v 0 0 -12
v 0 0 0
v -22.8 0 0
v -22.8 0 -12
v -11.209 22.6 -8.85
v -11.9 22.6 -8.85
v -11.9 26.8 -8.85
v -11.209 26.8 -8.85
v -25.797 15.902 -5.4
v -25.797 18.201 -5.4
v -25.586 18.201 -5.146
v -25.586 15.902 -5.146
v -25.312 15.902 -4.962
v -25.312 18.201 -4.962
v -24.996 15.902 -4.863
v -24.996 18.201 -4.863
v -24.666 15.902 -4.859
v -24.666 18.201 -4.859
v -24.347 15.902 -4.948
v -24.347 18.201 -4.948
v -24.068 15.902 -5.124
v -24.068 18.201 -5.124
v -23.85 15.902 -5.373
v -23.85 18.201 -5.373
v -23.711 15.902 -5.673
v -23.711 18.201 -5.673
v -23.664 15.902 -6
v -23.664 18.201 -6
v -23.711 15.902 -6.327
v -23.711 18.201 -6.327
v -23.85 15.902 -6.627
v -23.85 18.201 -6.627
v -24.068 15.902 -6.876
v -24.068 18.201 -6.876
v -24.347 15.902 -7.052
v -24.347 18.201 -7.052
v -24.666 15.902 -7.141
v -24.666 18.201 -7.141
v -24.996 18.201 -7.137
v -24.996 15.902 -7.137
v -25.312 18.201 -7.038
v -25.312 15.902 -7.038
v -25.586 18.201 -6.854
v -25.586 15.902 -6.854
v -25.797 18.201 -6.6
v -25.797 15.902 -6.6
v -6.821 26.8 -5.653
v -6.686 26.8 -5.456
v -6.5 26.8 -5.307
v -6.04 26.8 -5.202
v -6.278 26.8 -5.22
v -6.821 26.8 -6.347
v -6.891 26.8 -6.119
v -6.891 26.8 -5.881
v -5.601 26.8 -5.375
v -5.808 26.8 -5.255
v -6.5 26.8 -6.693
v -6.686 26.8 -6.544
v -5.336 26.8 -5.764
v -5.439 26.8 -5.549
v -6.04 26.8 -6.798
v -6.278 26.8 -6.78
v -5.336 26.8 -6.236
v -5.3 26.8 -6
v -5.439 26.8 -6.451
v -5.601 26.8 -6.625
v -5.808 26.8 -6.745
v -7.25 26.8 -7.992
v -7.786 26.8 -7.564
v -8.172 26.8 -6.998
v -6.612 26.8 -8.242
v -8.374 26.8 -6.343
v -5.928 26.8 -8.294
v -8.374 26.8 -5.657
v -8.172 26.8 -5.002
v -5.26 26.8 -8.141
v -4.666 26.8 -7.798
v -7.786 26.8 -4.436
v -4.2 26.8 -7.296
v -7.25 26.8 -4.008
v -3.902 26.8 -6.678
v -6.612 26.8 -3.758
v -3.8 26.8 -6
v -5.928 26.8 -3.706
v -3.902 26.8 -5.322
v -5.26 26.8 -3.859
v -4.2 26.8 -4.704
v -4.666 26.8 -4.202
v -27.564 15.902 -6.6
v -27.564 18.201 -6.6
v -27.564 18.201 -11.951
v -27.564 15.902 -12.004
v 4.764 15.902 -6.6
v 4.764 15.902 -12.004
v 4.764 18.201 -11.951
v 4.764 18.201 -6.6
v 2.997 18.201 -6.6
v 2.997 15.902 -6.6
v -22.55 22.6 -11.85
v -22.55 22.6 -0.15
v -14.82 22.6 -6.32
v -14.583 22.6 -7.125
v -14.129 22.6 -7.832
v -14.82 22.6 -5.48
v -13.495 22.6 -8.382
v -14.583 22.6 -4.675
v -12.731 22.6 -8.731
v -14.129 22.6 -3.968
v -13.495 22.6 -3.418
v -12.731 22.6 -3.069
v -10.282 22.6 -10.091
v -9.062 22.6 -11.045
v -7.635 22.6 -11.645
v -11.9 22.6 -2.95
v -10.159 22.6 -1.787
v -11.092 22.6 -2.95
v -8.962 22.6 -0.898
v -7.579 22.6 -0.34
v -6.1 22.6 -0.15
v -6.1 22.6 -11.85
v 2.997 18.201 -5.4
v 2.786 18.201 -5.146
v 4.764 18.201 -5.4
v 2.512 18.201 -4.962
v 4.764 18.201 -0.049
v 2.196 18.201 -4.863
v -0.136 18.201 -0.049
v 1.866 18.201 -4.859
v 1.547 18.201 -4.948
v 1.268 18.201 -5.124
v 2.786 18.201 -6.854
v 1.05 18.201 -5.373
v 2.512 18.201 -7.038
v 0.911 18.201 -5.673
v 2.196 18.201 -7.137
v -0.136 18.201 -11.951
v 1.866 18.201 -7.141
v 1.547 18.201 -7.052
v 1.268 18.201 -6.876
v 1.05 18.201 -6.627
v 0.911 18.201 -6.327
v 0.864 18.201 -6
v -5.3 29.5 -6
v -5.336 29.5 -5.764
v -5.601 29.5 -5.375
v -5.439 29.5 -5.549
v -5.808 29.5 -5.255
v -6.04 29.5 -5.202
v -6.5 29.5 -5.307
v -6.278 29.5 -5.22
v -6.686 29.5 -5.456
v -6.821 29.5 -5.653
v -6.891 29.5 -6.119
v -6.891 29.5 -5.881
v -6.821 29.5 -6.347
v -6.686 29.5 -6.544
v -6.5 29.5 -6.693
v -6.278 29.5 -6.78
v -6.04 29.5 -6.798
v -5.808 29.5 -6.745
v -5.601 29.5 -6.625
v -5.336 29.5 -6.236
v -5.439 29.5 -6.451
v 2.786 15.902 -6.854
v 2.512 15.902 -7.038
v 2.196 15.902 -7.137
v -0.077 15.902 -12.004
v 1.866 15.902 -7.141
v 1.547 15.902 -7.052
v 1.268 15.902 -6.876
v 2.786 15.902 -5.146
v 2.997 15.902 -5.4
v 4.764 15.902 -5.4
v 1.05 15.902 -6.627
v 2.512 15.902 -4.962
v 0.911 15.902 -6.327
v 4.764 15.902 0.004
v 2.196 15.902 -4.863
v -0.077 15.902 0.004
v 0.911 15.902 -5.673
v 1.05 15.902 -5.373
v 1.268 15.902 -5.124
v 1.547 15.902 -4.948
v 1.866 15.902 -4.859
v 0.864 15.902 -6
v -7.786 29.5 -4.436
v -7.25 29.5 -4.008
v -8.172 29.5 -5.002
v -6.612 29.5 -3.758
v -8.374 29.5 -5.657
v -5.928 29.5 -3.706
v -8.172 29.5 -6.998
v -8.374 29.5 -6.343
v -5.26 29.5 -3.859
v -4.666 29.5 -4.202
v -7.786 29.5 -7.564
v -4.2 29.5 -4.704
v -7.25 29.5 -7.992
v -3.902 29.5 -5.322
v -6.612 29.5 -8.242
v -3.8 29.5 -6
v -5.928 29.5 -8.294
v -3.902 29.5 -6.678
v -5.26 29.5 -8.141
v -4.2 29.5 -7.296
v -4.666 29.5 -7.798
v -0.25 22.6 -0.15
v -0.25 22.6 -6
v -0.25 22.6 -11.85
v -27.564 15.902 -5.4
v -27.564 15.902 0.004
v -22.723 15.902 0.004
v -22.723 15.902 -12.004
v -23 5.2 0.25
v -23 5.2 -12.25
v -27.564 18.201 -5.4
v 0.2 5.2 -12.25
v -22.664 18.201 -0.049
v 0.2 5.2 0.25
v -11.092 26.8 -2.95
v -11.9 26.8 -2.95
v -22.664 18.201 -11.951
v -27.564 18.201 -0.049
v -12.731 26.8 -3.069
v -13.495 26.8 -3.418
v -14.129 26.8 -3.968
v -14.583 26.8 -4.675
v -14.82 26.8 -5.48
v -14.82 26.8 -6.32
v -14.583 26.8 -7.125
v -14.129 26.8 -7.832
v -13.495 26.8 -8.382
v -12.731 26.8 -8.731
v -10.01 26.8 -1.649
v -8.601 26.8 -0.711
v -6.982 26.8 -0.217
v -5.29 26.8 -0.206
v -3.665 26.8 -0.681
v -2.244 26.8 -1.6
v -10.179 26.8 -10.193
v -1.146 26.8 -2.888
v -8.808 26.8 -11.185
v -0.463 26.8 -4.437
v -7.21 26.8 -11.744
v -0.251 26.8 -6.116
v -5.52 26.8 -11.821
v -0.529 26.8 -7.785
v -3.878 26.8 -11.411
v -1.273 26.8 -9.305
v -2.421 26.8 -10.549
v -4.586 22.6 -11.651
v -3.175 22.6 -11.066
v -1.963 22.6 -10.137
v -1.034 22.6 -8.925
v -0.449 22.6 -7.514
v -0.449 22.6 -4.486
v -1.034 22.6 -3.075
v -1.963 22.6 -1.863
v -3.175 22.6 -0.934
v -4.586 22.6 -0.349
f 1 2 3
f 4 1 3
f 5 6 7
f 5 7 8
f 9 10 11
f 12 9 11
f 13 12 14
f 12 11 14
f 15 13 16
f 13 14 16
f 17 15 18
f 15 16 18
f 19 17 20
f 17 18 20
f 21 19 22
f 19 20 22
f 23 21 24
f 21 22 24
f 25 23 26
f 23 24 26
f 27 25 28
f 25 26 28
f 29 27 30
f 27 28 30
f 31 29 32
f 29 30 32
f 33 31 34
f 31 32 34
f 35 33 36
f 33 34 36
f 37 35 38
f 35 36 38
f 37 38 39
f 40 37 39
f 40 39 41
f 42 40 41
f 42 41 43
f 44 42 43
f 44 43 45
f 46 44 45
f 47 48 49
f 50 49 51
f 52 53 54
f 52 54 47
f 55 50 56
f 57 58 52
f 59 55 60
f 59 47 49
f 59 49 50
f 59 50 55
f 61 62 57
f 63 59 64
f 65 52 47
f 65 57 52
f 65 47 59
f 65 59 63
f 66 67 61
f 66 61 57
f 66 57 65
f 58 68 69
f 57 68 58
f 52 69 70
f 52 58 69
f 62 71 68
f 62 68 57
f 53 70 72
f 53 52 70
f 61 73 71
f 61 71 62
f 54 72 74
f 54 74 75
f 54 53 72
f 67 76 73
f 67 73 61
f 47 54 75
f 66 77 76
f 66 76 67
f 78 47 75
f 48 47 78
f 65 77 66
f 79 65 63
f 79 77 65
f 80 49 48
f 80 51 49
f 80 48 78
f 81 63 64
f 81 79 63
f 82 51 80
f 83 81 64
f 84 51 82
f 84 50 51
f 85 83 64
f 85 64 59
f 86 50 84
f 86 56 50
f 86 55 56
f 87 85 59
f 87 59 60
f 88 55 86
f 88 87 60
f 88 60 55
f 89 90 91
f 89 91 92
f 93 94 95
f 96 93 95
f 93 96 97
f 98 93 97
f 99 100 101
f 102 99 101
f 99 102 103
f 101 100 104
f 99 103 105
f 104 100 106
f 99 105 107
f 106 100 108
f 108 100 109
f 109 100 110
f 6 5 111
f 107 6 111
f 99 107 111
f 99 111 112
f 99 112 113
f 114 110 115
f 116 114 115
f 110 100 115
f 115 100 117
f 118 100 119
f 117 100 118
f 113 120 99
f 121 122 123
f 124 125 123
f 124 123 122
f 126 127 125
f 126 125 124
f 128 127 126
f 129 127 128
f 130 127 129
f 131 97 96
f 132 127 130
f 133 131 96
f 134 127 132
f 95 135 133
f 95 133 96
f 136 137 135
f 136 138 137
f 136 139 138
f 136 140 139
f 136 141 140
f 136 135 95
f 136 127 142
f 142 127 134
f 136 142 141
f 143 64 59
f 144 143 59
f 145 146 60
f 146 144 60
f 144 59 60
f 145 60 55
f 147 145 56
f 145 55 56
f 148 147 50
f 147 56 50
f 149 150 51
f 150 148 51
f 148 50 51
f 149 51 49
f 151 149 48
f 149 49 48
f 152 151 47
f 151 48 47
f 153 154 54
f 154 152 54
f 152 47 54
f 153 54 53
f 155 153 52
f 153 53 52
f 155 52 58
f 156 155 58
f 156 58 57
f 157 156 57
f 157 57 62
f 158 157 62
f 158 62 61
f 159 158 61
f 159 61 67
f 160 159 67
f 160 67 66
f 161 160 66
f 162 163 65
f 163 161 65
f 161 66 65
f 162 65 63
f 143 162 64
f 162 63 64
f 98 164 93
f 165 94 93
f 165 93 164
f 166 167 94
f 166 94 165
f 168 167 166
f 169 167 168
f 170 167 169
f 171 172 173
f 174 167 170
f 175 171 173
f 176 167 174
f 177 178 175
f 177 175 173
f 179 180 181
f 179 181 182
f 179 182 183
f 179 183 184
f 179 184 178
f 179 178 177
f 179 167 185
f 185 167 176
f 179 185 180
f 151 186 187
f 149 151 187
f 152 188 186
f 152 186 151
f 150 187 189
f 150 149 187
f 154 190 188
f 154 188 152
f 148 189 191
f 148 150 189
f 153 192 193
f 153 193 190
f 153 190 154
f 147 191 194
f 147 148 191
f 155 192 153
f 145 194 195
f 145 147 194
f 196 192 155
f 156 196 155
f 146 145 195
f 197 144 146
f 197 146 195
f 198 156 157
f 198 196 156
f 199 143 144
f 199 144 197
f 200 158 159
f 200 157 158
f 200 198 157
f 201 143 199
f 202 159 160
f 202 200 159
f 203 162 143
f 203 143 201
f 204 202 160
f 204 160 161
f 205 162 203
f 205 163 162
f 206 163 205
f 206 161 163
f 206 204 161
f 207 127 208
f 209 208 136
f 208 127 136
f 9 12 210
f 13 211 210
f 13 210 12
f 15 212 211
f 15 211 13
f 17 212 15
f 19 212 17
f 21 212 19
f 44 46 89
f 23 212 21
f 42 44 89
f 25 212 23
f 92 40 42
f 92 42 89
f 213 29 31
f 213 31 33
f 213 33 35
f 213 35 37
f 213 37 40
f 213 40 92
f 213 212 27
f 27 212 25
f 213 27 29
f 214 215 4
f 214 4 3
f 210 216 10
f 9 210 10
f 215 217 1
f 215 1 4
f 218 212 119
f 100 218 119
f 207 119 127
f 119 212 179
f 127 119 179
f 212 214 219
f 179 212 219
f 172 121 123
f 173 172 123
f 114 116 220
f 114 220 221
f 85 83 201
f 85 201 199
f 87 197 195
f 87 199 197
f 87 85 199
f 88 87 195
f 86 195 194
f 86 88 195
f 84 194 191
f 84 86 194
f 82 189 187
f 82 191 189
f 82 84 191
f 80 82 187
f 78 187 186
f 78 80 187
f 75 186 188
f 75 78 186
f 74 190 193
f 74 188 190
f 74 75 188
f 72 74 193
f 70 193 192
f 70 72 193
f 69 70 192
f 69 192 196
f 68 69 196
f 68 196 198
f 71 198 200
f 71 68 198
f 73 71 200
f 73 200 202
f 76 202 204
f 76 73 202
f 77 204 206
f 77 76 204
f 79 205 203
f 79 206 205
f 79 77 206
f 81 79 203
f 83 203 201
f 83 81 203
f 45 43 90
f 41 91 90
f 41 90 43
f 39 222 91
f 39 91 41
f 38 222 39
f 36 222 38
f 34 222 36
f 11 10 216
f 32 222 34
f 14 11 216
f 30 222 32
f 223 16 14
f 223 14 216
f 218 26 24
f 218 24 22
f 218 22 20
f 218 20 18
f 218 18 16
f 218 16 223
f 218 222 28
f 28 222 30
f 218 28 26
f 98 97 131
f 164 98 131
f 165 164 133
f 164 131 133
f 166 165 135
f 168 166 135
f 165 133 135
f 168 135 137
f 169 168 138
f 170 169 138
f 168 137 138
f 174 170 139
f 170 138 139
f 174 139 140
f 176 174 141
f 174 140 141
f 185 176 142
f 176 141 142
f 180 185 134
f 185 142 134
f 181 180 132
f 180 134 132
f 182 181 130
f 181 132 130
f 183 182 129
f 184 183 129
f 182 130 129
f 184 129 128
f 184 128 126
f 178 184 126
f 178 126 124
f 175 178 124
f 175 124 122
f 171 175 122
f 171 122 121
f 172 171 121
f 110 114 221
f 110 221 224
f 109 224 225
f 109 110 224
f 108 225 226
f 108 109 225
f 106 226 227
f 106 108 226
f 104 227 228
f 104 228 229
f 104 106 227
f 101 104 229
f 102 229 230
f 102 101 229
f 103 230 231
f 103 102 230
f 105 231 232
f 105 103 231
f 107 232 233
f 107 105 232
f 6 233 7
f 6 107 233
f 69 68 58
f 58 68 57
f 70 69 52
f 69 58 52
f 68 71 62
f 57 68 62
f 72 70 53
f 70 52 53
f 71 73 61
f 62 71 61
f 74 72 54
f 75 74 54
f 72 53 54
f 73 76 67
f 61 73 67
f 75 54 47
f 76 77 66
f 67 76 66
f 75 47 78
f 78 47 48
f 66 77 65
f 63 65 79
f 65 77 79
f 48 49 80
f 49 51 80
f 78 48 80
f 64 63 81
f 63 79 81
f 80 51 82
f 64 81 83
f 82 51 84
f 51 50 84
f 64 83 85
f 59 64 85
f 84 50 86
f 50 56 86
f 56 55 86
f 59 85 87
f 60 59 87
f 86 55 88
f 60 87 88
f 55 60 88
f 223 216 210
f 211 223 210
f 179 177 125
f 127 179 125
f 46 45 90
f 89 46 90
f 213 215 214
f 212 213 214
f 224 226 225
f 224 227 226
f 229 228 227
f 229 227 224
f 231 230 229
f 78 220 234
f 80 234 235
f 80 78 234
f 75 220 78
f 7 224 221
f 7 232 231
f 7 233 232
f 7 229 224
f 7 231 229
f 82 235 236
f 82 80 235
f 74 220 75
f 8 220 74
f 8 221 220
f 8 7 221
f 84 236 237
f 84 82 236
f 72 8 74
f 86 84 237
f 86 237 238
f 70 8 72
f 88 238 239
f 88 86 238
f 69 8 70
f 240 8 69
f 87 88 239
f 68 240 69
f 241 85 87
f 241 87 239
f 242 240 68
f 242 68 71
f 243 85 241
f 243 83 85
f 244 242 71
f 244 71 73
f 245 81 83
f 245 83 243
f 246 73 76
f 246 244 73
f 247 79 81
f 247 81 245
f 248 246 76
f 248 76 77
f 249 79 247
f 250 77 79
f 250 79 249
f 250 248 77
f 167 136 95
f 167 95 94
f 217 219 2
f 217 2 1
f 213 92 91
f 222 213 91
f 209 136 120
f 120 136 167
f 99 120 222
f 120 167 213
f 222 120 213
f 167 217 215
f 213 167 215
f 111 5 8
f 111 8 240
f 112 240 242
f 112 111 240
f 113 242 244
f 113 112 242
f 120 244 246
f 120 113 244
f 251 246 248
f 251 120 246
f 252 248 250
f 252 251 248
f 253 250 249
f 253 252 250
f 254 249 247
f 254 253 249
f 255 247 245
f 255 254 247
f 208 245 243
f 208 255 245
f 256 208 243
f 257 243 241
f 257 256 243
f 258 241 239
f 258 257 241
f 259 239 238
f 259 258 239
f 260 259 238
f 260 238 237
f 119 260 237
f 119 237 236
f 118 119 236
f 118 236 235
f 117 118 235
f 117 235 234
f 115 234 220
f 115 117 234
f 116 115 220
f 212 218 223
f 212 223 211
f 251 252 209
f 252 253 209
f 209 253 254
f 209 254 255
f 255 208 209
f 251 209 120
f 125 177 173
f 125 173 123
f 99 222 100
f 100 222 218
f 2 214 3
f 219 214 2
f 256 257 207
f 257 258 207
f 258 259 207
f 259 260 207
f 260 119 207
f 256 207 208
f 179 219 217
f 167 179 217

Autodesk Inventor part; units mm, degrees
sketch "Sketch1" plane through (0, 0, 0) normal (0, 1, 0) x (-1, 0, 0)
  line L0 (0, 0) -> (22.8, 0)
  line L1 (22.8, 0) -> (22.8, -12)
  line L2 (22.8, -12) -> (0, -12)
  line L3 (0, -12) -> (0, 0)
  dimension "d0" = 22.8
  dimension "d1" = 12
ref_plane "Work Plane3" through (0, 5.2, 0) normal (0, 1, 0) x (-1, 0, 0)
sketch "Sketch5" plane through (0, 5.2, 0) normal (0, 1, 0) x (-1, 0, 0)
  line L0 (11.4, -12.25) -> (23, -12.25)
  line L1 (23, -12.25) -> (-0.2, -12.25)
  line L2 (-0.2, -12.25) -> (-0.2, 0.25)
  line L3 (-0.2, 0.25) -> (23, 0.25)
  line L4 (23, 0.25) -> (23, -12.25)
  dimension "d32" = 23.2
  dimension "d33" = 12.5
sketch "Sketch1 outline for Loft1" plane through (0, 0, 0) normal (0, 1, 0) x (-1, 0, 0)
  line L0 (0, 0) -> (22.8, 0)
  line L1 (22.8, 0) -> (22.8, -12)
  line L2 (22.8, -12) -> (0, -12)
  line L3 (0, -12) -> (0, 0)
sketch "Sketch5 outline for Loft1" plane through (0, 5.2, 0) normal (0, 1, 0) x (-1, 0, 0)
  line L0 (23, -12.25) -> (-0.2, -12.25)
  line L1 (-0.2, -12.25) -> (-0.2, 0.25)
  line L2 (-0.2, 0.25) -> (23, 0.25)
  line L3 (23, 0.25) -> (23, -12.25)
loft "Loft1" add profiles "Sketch1 outline for Loft1", "Sketch5 outline for Loft1"
ref_plane "Work Plane4" through (0, 22.6, 0) normal (0, 1, 0) x (-1, 0, 0)
sketch "Sketch7" plane through (0, 22.6, 0) normal (0, 1, 0) x (-1, 0, 0)
  line L0 (0.25, -6) -> (0.25, -0.15)
  line L1 (0.25, -0.15) -> (0.25, -11.85)
  line L2 (0.25, -11.85) -> (22.55, -11.85)
  line L3 (0.25, -11.85) -> (22.55, -11.85)
  line L4 (22.55, -11.85) -> (22.55, -0.15)
  line L5 (22.55, -0.15) -> (0.25, -0.15)
  line L6 (0.25, -0.15) -> (0.25, -11.85)
  point P0 (0, 0)
sketch "Sketch7 outline for Loft2" plane through (0, 22.6, 0) normal (0, 1, 0) x (-1, 0, 0)
  line L0 (0.25, -0.15) -> (0.25, -11.85)
  line L1 (22.55, -0.15) -> (0.25, -0.15)
  line L2 (22.55, -11.85) -> (22.55, -0.15)
  line L3 (0.25, -11.85) -> (22.55, -11.85)
loft "Loft2" add profiles "Sketch7 outline for Loft2" section 2 edges at (-11.4, 5.2, 0.25) (0.2, 5.2, -6) (-11.4, 5.2, -12.25) (-23, 5.2, -6)
ref_plane "Work Plane5" through (-11.4, 0, 0) normal (1, 0, 0) x (0, 1, 0)
ref_plane "Work Plane7" through (-0.136245, 18.201471, -0.048884) normal (1, 0, 0) x (0, 1, 0)
ref_plane "Work Plane8" through (-0.136245, 18.201471, -0.048884) normal (-0.0258534, 0.9996657, 0) x (0.9996657, 0.0258534, 0)
sketch "Sketch10" plane through (-0.136245, 18.201471, -0.048884) normal (1, 0, 0) x (0, 1, 0)
  line L0 (0, 0) -> (0, -11.902231)
  line L1 (-2.299231, -11.955087) -> (-2.299231, 0.052856)
  line L2 (4.398529, -0.101116) -> (-13.001471, 0.298884)
  line L3 (4.398529, -11.801116) -> (-13.001471, -12.201116)
  point P0 (-18.201471, 0.048884)
sketch "Sketch10 outline for Extrusion6" plane through (-0.136245, 18.201471, -0.048884) normal (1, 0, 0) x (0, 1, 0)
  line L0 (0, 0) -> (0, -11.902231)
  line L1 (0, -11.902231) -> (-2.299231, -11.955087)
  line L2 (-2.299231, -11.955087) -> (-2.299231, 0.052856)
  line L3 (-2.299231, 0.052856) -> (0, 0)
extrude "Extrusion6" add sketch "Sketch10 outline for Extrusion6" along normal blind 4.9
sketch "Sketch9" plane through (-0.136245, 18.201471, -0.048884) normal (0, 1, 0) x (1, 0, 0)
  arc A0 (3.133494, 6.551116) -> (3.133494, 5.351116) centre (2.151116, 5.951116) ccw
  line L0 (0, 11.902231) -> (4.5, 11.902231)
  line L1 (0, 0) -> (4.5, 0)
  line L2 (0, 0) -> (0, 11.902231)
  line L3 (4.5, 11.902231) -> (4.5, 0)
  line L4 (4.5, 5.951116) -> (4.5, 6.551116)
  line L5 (4.5, 6.551116) -> (3.133494, 6.551116)
  line L6 (3.133494, 6.551116) -> (5.264837, 6.551116)
  line L7 (5.264837, 6.551116) -> (5.264837, 5.351116)
  line L8 (5.264837, 5.351116) -> (3.133494, 5.351116)
  point P0 (-0.334371, -0.048884)
  dimension "d58" = 4.8
  dimension "d59" = 4.8
  dimension "d60" = 1
  dimension "d62" = 1.2
sketch "Sketch9 outline for Extrusion5" plane through (-0.136245, 18.201471, -0.048884) normal (0, 1, 0) x (1, 0, 0)
  line L0 (5.264837, 6.551116) -> (3.133494, 6.551116)
  line L1 (5.264837, 5.351116) -> (5.264837, 6.551116)
  line L2 (3.133494, 5.351116) -> (5.264837, 5.351116)
  arc A0 (3.133494, 6.551116) -> (3.133494, 5.351116) centre (2.151116, 5.951116) ccw
extrude "Extrusion5" cut sketch "Sketch9 outline for Extrusion5" against normal blind 4.5
mirror "Mirror3" about plane through (-11.4, 0, 0) normal (1, 0, 0) of "Extrusion6", "Extrusion5"
sketch "Sketch11" plane through (-22.55, 22.6, -11.85) normal (0, 1, 0) x (1, 0, 0)
  arc A0 (11.458006, -8.9) -> (11.341184, -3) centre (16.45, -5.85) ccw
  line L0 (22.3, 0) -> (0, 0)
  line L1 (0, -11.7) -> (22.3, -11.7)
  line L2 (22.3, -11.7) -> (22.3, 0)
  arc A1 (10.65, -3) -> (10.65, -8.9) centre (10.65, -5.95) ccw
  line L3 (10.65, -3) -> (11.341184, -3)
  line L4 (10.65, -8.9) -> (11.458006, -8.9)
  point P0 (22.55, -11.85)
  dimension "d68" = 0
  dimension "d69" = 0
  dimension "d70" = 0
  dimension "d71" = 3
  dimension "d72" = 2.8
  dimension "d73" = 14.6
  dimension "d74" = 5.9
sketch "Sketch11 outline for Extrusion7" plane through (-22.55, 22.6, -11.85) normal (0, 1, 0) x (1, 0, 0)
  arc A0 (11.341184, -3) -> (11.458006, -8.9) centre (16.45, -5.85) cw
  line L0 (11.458006, -8.9) -> (10.65, -8.9)
  arc A1 (10.65, -8.9) -> (10.65, -3) centre (10.65, -5.95) cw
  line L1 (10.65, -3) -> (11.341184, -3)
extrude "Extrusion7" add sketch "Sketch11 outline for Extrusion7" along normal blind 4.2
sketch "Sketch12" plane through (-22.55, 26.8, -11.85) normal (0, 1, 0) x (1, 0, 0)
  arc A0 (11.458006, -8.9) -> (11.341184, -3) centre (16.45, -5.85) ccw
  circle A1 centre (16.45, -5.85) radius 2.3
  circle A2 centre (16.45, -5.85) radius 0.8
  point P0 (22.55, -11.85)
  dimension "d77" = 4.6
  dimension "d78" = 1.5
sketch "Sketch12 outline for Extrusion8" plane through (-22.55, 26.8, -11.85) normal (0, 1, 0) x (1, 0, 0)
  circle A0 centre (16.45, -5.85) radius 2.3
  circle A1 centre (16.45, -5.85) radius 0.8
extrude "Extrusion8" add sketch "Sketch12 outline for Extrusion8" along normal blind 2.7
ref_plane "Work Plane9" through (-22.55, 26.8, -11.85) normal (0, 1, 0) x (1, 0, 0)
split body "Split1" result two bodies by plane through (-22.55, 26.8, -11.85) normal (0, 1, 0) first body at (-4.305837, 28.6, -5.85516)
properties part number "servo" material "ABS Plastic"
